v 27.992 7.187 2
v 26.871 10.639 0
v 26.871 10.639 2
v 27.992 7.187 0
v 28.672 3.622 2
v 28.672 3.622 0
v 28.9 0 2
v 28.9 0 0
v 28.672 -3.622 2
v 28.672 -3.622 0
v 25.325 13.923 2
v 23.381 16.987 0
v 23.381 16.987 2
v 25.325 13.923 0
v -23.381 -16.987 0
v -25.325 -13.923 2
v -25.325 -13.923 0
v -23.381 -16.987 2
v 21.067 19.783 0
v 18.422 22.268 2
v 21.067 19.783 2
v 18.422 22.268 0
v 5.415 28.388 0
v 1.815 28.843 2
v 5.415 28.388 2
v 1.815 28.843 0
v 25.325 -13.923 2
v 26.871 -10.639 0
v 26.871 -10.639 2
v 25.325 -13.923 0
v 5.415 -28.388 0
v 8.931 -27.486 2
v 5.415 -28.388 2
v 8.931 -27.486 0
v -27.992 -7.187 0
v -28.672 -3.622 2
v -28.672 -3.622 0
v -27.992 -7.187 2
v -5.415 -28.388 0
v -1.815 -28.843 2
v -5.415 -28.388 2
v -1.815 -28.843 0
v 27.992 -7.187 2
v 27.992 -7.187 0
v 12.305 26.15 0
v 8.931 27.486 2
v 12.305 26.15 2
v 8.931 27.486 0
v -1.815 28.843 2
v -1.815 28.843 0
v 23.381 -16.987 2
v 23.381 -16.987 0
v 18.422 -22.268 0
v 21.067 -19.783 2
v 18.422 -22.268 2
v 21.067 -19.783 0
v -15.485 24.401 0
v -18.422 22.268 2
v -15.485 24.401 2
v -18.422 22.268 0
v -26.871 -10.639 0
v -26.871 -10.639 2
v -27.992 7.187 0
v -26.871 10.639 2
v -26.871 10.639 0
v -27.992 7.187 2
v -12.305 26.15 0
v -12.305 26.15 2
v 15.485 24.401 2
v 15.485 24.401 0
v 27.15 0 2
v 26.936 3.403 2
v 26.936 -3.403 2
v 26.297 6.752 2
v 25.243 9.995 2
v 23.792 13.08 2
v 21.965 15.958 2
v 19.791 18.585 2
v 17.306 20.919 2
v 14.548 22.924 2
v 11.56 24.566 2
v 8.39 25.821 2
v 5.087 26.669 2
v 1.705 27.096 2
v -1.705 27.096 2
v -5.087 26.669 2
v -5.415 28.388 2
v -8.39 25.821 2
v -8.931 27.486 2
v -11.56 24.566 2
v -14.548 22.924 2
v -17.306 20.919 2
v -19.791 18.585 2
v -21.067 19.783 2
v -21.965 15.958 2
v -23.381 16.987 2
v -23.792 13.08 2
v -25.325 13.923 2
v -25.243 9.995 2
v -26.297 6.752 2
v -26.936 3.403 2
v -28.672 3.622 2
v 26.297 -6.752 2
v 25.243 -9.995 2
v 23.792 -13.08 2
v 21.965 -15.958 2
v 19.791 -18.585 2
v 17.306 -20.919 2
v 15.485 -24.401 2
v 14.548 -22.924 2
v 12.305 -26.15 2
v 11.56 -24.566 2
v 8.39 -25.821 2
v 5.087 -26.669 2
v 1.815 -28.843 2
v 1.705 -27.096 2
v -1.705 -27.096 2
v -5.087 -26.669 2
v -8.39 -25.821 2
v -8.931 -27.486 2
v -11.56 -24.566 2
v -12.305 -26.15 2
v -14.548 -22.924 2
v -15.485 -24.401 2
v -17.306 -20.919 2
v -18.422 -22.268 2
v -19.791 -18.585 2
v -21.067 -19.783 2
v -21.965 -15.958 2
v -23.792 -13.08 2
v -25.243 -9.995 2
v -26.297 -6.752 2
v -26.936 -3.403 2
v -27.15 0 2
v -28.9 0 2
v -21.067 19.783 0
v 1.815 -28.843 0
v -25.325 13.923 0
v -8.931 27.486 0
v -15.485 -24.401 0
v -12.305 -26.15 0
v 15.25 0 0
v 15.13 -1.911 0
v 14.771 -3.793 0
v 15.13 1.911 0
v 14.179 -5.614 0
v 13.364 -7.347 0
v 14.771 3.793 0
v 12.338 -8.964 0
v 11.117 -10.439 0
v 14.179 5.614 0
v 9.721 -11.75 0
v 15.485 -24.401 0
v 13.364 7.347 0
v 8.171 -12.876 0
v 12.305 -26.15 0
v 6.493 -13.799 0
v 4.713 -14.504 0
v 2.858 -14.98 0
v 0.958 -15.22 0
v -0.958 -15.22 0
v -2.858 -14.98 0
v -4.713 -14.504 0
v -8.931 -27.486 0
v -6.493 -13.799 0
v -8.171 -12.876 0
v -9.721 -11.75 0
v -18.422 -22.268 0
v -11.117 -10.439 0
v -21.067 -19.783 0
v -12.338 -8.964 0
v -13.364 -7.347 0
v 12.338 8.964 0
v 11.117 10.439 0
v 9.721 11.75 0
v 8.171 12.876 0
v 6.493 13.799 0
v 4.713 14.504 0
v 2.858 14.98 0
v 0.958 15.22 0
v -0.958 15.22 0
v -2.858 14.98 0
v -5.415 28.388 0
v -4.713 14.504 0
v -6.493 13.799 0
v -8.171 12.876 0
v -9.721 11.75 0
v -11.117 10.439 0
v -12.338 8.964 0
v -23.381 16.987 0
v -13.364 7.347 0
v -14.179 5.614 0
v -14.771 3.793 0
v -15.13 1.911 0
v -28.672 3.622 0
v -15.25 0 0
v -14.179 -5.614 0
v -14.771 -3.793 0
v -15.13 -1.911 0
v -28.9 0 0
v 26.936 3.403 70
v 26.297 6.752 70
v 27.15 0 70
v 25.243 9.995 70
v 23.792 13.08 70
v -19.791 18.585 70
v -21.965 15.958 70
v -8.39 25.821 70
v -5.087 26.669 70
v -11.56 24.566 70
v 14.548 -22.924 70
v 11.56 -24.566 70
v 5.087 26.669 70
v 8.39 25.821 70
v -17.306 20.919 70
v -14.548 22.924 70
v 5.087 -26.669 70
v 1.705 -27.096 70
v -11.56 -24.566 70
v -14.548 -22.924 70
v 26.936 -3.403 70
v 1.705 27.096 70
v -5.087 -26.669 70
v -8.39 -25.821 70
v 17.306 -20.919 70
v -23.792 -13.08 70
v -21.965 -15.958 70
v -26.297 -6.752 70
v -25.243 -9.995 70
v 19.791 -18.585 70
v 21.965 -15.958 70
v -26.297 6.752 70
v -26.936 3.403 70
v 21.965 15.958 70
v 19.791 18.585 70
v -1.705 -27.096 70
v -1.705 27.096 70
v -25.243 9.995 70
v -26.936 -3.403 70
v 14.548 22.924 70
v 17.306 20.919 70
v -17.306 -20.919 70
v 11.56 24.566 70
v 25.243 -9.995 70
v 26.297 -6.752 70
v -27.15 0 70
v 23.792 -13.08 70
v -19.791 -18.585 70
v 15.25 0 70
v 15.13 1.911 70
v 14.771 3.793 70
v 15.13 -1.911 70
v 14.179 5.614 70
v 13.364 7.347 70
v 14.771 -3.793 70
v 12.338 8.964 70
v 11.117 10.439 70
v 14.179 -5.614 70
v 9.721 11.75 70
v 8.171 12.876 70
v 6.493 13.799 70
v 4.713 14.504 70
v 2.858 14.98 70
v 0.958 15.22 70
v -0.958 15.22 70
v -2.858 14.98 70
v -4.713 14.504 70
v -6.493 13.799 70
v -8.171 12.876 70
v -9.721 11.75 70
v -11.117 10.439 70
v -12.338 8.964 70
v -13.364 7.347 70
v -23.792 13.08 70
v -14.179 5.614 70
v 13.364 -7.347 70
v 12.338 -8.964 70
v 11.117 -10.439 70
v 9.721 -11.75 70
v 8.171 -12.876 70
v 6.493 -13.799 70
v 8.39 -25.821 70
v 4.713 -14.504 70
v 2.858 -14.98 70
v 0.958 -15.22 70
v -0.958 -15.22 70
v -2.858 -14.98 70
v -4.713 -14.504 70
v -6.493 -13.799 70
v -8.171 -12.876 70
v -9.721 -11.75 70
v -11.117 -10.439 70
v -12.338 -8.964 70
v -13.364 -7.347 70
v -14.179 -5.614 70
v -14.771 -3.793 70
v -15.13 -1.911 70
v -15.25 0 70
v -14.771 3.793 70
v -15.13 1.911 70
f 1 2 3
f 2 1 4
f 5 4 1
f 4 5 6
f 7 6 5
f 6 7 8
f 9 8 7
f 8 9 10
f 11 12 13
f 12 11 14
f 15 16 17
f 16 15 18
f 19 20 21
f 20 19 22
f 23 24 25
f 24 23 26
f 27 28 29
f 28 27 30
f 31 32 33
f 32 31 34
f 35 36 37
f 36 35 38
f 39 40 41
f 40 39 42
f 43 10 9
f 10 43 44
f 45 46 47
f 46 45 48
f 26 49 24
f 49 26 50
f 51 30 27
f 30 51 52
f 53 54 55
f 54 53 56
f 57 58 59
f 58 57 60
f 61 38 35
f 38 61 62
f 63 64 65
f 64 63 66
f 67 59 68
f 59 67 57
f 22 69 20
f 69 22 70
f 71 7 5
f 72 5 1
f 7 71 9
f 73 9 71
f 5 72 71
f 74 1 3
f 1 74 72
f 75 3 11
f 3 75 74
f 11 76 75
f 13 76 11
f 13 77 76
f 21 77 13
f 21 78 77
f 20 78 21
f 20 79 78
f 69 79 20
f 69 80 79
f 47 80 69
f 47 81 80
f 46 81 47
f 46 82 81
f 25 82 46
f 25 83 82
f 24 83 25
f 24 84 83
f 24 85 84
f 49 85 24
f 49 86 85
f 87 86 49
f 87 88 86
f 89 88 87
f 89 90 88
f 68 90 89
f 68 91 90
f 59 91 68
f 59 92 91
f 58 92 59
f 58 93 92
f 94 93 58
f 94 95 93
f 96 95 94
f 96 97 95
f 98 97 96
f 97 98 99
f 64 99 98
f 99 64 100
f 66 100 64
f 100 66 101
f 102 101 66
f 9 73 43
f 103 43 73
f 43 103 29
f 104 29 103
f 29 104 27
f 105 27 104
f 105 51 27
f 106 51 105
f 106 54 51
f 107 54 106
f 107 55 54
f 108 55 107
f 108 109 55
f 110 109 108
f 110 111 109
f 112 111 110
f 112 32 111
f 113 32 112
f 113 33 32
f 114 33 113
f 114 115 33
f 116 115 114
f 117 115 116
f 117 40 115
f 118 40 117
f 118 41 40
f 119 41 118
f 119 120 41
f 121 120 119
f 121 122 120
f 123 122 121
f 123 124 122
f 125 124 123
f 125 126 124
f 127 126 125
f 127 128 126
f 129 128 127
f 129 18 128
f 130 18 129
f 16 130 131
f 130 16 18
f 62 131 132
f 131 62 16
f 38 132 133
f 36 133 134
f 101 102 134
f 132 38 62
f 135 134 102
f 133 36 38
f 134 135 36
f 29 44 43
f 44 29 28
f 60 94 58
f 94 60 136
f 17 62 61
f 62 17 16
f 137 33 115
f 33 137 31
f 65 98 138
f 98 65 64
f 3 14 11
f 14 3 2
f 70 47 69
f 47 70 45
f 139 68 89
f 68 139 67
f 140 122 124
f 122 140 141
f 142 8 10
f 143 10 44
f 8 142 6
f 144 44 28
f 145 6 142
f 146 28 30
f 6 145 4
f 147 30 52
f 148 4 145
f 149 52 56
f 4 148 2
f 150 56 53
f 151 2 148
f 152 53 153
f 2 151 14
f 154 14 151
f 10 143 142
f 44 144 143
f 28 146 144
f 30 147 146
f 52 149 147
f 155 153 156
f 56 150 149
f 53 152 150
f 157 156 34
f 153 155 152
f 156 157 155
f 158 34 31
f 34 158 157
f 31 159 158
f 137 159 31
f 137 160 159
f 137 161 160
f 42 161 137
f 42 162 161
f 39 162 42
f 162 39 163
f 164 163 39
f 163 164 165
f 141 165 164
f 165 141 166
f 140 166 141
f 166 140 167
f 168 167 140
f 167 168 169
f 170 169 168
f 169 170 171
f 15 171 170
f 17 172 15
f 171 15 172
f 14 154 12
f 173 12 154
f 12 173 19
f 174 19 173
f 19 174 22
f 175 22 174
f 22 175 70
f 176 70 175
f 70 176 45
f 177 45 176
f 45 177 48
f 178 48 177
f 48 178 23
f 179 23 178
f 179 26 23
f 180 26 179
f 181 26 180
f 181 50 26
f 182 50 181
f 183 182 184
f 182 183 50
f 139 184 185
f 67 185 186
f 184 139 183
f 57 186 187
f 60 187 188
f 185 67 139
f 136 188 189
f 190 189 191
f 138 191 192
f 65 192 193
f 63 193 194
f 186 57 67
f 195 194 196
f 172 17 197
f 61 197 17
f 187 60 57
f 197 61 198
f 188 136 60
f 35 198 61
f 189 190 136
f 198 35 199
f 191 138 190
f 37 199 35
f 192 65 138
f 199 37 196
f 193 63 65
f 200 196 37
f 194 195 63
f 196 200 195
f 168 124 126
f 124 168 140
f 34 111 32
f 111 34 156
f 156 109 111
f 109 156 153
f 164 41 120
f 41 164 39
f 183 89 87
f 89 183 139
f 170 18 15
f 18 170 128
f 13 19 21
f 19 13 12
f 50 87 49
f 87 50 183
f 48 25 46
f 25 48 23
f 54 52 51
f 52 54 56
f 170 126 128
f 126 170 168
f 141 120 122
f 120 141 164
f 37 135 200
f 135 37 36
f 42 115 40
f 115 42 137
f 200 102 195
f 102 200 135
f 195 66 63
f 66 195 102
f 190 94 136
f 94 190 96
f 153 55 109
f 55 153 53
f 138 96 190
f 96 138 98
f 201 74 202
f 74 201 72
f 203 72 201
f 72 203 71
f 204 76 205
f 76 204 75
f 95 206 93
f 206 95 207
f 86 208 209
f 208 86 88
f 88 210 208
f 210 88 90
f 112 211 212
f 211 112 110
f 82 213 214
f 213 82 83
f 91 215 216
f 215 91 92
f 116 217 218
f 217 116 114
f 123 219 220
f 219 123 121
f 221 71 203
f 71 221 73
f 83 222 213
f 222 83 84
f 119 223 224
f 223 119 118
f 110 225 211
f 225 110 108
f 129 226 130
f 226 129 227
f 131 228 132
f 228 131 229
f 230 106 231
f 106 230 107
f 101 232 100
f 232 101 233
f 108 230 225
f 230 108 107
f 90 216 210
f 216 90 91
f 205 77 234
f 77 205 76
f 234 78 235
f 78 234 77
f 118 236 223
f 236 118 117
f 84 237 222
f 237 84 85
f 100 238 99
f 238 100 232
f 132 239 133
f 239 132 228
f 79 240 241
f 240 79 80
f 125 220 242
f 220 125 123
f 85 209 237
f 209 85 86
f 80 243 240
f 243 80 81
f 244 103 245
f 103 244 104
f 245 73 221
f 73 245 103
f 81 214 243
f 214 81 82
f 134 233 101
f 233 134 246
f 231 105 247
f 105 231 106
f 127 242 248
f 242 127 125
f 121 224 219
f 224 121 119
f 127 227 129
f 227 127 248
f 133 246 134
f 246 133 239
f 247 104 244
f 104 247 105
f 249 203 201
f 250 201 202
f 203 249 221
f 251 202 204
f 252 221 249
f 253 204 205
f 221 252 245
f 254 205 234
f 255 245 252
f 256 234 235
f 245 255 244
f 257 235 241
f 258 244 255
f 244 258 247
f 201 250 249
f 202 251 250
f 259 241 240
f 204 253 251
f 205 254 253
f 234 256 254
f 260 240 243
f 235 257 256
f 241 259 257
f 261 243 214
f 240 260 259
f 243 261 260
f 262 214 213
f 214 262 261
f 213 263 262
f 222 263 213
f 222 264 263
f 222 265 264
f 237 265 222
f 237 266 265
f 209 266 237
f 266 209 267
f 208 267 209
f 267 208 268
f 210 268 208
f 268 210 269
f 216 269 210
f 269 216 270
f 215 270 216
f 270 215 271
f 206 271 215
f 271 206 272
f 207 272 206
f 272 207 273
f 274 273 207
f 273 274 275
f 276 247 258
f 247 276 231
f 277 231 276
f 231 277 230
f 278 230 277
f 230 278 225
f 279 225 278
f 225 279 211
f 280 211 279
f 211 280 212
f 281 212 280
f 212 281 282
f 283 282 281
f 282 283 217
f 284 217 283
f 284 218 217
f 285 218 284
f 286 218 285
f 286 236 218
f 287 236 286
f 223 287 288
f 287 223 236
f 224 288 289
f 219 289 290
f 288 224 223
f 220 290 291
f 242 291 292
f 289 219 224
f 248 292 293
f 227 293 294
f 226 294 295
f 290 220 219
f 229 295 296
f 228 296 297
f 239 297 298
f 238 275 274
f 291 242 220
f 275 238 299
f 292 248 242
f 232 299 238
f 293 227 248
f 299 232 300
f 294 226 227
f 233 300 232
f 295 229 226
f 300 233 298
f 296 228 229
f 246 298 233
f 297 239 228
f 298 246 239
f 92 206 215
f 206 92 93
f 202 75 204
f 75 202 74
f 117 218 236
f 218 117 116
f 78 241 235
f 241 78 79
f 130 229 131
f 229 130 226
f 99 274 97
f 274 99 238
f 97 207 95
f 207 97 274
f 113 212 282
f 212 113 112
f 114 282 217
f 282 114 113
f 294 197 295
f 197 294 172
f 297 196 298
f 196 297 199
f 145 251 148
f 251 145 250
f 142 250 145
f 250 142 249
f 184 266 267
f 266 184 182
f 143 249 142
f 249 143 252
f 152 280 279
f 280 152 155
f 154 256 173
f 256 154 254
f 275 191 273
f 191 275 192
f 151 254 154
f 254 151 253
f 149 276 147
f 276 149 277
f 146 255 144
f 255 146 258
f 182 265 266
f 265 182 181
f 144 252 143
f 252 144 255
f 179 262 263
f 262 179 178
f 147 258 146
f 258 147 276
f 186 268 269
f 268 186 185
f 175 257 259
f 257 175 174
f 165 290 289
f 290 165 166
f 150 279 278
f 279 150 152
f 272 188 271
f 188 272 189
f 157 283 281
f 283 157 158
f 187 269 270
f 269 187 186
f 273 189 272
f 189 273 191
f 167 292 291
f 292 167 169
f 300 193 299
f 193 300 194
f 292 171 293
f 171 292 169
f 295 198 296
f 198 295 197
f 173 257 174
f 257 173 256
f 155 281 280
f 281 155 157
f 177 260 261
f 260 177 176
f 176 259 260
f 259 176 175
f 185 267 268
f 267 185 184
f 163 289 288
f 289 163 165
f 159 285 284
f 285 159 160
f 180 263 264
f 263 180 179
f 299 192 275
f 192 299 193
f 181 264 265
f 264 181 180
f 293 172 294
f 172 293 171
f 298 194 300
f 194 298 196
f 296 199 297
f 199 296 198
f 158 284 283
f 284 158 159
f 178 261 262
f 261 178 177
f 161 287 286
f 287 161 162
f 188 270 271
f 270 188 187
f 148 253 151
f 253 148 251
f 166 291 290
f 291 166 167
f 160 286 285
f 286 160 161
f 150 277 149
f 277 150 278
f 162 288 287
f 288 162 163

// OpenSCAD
// All measurements are in mm.

// Hatchbox: 68 x 54.8
// 3D Solutech: 60 x 57.8
// Melca: 54 x 54
// Dikale: 62.7 x 57
// Tianse: 72.8 x 56.1

// The depth of the hole that the spool is filling. I.e., the width of the spool.
hole_depth = 68;

// The diameter of the hole that the spool is filling. Measure this as accurately as possible, we'll make leeway adjustments later.
hole_diameter = 54.8;

// The diameter of the hub around which the spool hub will turn. Measure this as accurately as possible, we'll make leeway adjustments later.
hub_diameter = 30;

// The thickness of the lip edge.
lip_thickness = 2.0;

// The width of the lip edge.
lip_width = 1.5;

// Allow this much space around the spool and hub.
leeway = 0.5;

// preview[view:north east, tilt:top diagonal]

$fn = 50;
difference() {
    union() {
        cylinder(
            lip_thickness,
            (hole_diameter / 2) + lip_width,
            (hole_diameter / 2) + lip_width
        );
        translate([0, 0, lip_thickness])
            cylinder(
                hole_depth,
                (hole_diameter / 2) - (leeway / 2),
                (hole_diameter / 2) - (leeway / 2)
            );
    }
    translate([0, 0, -5])
        cylinder(
            hole_depth + 10,
            (hub_diameter / 2) + (leeway / 2),
            (hub_diameter / 2) + (leeway / 2)
        );
}
